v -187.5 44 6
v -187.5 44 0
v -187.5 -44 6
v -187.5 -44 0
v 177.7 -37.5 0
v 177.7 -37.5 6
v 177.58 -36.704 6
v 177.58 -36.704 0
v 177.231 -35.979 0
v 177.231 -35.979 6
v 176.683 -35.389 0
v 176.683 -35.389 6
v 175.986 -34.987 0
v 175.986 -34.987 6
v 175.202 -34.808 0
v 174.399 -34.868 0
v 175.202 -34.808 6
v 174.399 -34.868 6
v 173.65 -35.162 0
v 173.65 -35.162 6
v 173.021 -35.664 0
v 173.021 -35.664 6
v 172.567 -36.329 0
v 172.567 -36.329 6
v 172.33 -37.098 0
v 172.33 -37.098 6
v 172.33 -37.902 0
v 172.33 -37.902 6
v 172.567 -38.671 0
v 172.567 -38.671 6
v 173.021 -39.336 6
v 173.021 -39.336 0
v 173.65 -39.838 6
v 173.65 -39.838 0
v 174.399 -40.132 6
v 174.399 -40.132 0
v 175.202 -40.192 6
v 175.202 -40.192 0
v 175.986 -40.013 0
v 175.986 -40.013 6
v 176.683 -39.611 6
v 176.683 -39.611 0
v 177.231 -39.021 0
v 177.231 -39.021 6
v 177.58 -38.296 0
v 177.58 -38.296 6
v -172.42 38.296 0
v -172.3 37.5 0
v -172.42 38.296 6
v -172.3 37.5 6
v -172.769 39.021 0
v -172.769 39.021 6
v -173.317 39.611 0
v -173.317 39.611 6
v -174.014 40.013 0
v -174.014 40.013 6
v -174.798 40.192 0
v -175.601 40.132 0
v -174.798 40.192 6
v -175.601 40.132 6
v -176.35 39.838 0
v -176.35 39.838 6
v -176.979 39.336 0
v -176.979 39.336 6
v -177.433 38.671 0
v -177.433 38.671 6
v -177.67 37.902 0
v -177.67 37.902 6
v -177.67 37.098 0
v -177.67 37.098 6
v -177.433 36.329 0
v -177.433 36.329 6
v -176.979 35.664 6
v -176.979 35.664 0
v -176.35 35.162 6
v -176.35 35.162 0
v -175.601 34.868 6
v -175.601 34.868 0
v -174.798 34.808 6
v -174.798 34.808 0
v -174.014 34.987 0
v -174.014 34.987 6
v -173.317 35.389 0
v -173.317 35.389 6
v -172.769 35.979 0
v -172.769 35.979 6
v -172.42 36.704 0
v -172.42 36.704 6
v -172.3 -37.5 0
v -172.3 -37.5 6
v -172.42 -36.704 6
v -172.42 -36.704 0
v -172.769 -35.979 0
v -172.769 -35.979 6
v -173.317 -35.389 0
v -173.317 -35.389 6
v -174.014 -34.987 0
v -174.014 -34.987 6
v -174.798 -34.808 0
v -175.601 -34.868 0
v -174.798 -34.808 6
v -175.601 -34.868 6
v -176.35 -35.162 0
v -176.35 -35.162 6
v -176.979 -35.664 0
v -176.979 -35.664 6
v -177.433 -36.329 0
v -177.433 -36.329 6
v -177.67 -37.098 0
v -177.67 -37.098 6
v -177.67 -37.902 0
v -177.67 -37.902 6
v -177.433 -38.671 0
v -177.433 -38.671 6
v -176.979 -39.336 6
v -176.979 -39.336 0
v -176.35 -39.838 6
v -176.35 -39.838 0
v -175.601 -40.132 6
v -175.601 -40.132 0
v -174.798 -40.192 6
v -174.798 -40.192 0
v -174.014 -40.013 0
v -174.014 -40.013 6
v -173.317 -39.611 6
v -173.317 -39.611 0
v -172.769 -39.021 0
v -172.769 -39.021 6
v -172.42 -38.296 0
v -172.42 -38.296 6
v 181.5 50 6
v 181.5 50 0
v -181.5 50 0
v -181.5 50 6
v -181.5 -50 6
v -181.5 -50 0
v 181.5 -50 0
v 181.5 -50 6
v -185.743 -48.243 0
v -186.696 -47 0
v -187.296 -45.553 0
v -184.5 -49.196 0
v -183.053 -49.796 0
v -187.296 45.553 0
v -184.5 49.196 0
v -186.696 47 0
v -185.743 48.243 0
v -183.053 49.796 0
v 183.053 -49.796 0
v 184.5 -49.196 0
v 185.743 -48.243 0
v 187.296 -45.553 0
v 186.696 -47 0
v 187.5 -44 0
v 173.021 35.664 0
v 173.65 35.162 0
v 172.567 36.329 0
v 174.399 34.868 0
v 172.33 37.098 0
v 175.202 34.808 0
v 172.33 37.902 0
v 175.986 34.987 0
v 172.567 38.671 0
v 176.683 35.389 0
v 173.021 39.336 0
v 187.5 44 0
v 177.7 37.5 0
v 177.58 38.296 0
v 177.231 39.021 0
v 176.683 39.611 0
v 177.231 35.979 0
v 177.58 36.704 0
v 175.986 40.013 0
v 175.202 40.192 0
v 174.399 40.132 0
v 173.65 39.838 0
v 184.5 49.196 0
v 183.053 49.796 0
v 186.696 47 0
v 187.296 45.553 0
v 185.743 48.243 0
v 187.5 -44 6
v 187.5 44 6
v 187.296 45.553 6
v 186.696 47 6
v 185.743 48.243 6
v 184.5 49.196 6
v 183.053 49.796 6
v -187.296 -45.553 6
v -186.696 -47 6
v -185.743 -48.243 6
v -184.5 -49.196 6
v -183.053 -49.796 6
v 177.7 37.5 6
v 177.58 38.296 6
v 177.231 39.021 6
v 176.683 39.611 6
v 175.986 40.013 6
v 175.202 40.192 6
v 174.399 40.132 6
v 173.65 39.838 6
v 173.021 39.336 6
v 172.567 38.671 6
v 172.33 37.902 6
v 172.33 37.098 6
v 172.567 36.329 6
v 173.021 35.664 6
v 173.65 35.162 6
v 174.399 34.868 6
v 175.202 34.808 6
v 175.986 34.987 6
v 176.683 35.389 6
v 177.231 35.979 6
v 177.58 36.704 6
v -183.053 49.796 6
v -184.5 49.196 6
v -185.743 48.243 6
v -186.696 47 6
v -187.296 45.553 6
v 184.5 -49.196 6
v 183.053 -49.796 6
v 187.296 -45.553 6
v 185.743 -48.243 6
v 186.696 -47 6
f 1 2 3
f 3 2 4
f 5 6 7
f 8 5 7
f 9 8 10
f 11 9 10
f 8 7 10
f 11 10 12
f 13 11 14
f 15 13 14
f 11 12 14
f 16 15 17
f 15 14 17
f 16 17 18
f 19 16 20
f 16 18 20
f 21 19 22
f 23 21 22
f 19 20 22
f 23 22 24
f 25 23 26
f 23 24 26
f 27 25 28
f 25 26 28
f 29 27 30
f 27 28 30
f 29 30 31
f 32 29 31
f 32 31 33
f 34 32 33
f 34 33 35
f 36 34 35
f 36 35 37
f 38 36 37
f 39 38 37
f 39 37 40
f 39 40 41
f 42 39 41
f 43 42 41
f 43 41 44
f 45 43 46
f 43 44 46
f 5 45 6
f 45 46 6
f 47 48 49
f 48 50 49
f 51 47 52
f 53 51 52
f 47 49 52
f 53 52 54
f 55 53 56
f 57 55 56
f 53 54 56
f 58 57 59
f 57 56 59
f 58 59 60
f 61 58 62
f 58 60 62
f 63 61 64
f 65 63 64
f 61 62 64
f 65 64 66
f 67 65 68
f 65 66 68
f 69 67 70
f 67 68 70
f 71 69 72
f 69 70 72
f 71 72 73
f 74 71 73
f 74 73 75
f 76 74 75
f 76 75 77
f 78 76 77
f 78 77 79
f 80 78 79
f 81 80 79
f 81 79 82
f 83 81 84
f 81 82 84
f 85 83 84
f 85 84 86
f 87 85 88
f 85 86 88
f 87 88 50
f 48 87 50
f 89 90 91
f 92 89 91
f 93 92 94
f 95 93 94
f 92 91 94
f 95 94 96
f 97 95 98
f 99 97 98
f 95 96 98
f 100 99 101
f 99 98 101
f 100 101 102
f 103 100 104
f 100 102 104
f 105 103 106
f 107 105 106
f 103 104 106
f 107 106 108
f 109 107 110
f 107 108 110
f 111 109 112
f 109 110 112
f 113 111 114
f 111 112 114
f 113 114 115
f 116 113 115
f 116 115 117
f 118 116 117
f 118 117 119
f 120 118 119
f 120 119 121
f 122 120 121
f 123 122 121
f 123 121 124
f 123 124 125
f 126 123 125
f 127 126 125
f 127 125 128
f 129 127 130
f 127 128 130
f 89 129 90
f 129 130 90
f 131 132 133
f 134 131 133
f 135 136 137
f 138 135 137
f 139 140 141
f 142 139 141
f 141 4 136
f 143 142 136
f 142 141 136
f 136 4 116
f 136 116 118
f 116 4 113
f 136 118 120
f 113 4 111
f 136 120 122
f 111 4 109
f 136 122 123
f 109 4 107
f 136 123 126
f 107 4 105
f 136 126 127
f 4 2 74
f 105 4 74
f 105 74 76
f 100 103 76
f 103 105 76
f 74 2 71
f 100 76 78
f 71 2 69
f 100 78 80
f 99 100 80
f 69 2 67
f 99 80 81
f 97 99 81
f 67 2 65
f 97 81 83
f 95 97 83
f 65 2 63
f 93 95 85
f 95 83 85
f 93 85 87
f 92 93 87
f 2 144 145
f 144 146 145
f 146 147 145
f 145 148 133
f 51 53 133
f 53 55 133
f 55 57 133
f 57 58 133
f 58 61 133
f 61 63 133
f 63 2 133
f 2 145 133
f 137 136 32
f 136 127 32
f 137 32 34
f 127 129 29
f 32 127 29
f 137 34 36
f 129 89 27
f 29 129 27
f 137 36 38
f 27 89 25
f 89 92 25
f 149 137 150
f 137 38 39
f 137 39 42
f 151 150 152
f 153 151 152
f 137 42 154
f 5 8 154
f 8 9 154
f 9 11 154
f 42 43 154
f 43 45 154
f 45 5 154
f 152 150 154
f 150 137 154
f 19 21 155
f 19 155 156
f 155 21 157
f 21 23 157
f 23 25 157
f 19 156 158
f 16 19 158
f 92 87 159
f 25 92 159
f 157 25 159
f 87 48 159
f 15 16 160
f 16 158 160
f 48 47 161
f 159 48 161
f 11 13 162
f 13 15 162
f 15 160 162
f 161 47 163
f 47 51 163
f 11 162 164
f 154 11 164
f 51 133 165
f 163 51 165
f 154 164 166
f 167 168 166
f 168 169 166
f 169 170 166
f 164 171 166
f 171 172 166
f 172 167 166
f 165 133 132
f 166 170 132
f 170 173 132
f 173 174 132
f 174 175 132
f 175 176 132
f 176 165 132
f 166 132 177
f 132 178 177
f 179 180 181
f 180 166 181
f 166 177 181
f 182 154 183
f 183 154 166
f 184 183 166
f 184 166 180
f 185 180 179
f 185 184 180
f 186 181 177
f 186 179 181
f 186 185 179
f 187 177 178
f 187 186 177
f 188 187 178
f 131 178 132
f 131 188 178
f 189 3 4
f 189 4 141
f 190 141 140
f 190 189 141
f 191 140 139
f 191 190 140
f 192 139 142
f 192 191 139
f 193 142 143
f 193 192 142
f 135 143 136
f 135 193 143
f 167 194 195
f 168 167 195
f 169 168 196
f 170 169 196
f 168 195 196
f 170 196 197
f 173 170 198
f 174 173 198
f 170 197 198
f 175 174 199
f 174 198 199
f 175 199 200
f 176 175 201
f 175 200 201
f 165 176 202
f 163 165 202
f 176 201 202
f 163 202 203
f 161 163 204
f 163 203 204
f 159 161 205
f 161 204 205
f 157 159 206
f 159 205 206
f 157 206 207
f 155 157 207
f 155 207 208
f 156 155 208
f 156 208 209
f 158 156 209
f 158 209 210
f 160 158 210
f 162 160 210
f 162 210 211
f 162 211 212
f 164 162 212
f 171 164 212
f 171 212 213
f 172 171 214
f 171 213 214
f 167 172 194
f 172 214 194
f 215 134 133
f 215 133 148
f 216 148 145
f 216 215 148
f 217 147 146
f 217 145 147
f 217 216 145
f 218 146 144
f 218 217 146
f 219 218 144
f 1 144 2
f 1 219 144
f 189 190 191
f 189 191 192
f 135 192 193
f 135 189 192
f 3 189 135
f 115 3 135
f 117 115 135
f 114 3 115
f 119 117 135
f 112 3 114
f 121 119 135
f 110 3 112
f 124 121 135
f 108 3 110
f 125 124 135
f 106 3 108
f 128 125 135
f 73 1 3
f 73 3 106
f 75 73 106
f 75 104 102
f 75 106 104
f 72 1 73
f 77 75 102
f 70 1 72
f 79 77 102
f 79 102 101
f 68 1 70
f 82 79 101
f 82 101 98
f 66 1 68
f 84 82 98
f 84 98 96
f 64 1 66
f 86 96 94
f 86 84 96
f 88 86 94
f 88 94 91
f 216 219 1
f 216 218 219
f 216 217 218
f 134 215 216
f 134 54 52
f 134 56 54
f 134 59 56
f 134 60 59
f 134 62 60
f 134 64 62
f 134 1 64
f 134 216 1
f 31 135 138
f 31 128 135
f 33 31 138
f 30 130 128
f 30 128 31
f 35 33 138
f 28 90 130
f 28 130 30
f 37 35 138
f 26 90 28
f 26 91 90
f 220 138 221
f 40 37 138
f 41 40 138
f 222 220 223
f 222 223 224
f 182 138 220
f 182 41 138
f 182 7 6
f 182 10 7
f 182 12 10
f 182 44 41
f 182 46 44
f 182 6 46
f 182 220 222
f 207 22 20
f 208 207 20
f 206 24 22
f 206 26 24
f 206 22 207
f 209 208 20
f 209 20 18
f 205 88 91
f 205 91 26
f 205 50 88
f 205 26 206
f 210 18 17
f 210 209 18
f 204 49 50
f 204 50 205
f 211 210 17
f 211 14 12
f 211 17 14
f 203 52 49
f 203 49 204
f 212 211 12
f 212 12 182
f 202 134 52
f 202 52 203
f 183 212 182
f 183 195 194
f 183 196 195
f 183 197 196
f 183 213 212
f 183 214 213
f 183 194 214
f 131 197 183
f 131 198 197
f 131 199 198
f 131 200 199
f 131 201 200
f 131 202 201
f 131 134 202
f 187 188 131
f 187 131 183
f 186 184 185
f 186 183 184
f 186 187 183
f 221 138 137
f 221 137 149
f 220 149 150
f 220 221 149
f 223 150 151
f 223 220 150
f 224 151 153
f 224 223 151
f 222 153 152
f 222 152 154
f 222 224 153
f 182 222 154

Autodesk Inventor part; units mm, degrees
ref_plane "YZ Plane" through (0, 0, 0) normal (1, 0, 0) x (0, 1, 0)
ref_plane "XZ Plane" through (0, 0, 0) normal (0, 1, 0) x (-1, 0, 0)
ref_plane "XY Plane" through (0, 0, 0) normal (0, 0, 1) x (1, 0, 0)
sketch "Sketch1" plane through (0, 0, 0) normal (0, 0, 1) x (1, 0, 0)
  line L0 (-187.5, -50) -> (187.5, -50)
  line L1 (187.5, -50) -> (187.5, 50)
  line L2 (187.5, 50) -> (-187.5, 50)
  line L3 (-187.5, 50) -> (-187.5, -50)
  line L4 (-187.5, -50) -> (187.5, 50) construction
  line L5 (187.5, -50) -> (-187.5, 50) construction
  point P0 (0, 0)
  dimension "d0" = 375
  dimension "d1" = 100
extrude "Extrusion1" add sketch "Sketch1" along normal blind 6
sketch "Sketch8" plane through (0, 0, 6) normal (0, 0, 1) x (1, 0, 0)
  circle A0 centre (-175, 37.5) radius 2.7
  circle A1 centre (-175, -37.5) radius 2.7
  circle A2 centre (175, -37.5) radius 2.7
  circle A3 centre (175, 37.5) radius 2.7
  line L0 (-187.5, 50) -> (-187.5, -50) projected
  line L1 (187.5, 50) -> (-187.5, 50) projected
  line L2 (187.5, -50) -> (187.5, 50) projected
  line L3 (-187.5, -50) -> (187.5, -50) projected
  dimension "d40" = 12.5
  dimension "d41" = 12.5
  dimension "d42" = 12.5
  dimension "d43" = 12.5
  dimension "d44" = 5.4
extrude "Extrusion8" cut sketch "Sketch8" against normal through all contours A0 | A1 | A2 | A3
fillet "Fillet3" radius 6 4 edges at (187.5, -50, 3) (-187.5, 50, 3) (-187.5, -50, 3) (187.5, 50, 3)
equation "\"d41\" = d40"
equation "\"d42\" = d40"
equation "\"d43\" = d40"
properties part number "ProjectorPlateBack"
